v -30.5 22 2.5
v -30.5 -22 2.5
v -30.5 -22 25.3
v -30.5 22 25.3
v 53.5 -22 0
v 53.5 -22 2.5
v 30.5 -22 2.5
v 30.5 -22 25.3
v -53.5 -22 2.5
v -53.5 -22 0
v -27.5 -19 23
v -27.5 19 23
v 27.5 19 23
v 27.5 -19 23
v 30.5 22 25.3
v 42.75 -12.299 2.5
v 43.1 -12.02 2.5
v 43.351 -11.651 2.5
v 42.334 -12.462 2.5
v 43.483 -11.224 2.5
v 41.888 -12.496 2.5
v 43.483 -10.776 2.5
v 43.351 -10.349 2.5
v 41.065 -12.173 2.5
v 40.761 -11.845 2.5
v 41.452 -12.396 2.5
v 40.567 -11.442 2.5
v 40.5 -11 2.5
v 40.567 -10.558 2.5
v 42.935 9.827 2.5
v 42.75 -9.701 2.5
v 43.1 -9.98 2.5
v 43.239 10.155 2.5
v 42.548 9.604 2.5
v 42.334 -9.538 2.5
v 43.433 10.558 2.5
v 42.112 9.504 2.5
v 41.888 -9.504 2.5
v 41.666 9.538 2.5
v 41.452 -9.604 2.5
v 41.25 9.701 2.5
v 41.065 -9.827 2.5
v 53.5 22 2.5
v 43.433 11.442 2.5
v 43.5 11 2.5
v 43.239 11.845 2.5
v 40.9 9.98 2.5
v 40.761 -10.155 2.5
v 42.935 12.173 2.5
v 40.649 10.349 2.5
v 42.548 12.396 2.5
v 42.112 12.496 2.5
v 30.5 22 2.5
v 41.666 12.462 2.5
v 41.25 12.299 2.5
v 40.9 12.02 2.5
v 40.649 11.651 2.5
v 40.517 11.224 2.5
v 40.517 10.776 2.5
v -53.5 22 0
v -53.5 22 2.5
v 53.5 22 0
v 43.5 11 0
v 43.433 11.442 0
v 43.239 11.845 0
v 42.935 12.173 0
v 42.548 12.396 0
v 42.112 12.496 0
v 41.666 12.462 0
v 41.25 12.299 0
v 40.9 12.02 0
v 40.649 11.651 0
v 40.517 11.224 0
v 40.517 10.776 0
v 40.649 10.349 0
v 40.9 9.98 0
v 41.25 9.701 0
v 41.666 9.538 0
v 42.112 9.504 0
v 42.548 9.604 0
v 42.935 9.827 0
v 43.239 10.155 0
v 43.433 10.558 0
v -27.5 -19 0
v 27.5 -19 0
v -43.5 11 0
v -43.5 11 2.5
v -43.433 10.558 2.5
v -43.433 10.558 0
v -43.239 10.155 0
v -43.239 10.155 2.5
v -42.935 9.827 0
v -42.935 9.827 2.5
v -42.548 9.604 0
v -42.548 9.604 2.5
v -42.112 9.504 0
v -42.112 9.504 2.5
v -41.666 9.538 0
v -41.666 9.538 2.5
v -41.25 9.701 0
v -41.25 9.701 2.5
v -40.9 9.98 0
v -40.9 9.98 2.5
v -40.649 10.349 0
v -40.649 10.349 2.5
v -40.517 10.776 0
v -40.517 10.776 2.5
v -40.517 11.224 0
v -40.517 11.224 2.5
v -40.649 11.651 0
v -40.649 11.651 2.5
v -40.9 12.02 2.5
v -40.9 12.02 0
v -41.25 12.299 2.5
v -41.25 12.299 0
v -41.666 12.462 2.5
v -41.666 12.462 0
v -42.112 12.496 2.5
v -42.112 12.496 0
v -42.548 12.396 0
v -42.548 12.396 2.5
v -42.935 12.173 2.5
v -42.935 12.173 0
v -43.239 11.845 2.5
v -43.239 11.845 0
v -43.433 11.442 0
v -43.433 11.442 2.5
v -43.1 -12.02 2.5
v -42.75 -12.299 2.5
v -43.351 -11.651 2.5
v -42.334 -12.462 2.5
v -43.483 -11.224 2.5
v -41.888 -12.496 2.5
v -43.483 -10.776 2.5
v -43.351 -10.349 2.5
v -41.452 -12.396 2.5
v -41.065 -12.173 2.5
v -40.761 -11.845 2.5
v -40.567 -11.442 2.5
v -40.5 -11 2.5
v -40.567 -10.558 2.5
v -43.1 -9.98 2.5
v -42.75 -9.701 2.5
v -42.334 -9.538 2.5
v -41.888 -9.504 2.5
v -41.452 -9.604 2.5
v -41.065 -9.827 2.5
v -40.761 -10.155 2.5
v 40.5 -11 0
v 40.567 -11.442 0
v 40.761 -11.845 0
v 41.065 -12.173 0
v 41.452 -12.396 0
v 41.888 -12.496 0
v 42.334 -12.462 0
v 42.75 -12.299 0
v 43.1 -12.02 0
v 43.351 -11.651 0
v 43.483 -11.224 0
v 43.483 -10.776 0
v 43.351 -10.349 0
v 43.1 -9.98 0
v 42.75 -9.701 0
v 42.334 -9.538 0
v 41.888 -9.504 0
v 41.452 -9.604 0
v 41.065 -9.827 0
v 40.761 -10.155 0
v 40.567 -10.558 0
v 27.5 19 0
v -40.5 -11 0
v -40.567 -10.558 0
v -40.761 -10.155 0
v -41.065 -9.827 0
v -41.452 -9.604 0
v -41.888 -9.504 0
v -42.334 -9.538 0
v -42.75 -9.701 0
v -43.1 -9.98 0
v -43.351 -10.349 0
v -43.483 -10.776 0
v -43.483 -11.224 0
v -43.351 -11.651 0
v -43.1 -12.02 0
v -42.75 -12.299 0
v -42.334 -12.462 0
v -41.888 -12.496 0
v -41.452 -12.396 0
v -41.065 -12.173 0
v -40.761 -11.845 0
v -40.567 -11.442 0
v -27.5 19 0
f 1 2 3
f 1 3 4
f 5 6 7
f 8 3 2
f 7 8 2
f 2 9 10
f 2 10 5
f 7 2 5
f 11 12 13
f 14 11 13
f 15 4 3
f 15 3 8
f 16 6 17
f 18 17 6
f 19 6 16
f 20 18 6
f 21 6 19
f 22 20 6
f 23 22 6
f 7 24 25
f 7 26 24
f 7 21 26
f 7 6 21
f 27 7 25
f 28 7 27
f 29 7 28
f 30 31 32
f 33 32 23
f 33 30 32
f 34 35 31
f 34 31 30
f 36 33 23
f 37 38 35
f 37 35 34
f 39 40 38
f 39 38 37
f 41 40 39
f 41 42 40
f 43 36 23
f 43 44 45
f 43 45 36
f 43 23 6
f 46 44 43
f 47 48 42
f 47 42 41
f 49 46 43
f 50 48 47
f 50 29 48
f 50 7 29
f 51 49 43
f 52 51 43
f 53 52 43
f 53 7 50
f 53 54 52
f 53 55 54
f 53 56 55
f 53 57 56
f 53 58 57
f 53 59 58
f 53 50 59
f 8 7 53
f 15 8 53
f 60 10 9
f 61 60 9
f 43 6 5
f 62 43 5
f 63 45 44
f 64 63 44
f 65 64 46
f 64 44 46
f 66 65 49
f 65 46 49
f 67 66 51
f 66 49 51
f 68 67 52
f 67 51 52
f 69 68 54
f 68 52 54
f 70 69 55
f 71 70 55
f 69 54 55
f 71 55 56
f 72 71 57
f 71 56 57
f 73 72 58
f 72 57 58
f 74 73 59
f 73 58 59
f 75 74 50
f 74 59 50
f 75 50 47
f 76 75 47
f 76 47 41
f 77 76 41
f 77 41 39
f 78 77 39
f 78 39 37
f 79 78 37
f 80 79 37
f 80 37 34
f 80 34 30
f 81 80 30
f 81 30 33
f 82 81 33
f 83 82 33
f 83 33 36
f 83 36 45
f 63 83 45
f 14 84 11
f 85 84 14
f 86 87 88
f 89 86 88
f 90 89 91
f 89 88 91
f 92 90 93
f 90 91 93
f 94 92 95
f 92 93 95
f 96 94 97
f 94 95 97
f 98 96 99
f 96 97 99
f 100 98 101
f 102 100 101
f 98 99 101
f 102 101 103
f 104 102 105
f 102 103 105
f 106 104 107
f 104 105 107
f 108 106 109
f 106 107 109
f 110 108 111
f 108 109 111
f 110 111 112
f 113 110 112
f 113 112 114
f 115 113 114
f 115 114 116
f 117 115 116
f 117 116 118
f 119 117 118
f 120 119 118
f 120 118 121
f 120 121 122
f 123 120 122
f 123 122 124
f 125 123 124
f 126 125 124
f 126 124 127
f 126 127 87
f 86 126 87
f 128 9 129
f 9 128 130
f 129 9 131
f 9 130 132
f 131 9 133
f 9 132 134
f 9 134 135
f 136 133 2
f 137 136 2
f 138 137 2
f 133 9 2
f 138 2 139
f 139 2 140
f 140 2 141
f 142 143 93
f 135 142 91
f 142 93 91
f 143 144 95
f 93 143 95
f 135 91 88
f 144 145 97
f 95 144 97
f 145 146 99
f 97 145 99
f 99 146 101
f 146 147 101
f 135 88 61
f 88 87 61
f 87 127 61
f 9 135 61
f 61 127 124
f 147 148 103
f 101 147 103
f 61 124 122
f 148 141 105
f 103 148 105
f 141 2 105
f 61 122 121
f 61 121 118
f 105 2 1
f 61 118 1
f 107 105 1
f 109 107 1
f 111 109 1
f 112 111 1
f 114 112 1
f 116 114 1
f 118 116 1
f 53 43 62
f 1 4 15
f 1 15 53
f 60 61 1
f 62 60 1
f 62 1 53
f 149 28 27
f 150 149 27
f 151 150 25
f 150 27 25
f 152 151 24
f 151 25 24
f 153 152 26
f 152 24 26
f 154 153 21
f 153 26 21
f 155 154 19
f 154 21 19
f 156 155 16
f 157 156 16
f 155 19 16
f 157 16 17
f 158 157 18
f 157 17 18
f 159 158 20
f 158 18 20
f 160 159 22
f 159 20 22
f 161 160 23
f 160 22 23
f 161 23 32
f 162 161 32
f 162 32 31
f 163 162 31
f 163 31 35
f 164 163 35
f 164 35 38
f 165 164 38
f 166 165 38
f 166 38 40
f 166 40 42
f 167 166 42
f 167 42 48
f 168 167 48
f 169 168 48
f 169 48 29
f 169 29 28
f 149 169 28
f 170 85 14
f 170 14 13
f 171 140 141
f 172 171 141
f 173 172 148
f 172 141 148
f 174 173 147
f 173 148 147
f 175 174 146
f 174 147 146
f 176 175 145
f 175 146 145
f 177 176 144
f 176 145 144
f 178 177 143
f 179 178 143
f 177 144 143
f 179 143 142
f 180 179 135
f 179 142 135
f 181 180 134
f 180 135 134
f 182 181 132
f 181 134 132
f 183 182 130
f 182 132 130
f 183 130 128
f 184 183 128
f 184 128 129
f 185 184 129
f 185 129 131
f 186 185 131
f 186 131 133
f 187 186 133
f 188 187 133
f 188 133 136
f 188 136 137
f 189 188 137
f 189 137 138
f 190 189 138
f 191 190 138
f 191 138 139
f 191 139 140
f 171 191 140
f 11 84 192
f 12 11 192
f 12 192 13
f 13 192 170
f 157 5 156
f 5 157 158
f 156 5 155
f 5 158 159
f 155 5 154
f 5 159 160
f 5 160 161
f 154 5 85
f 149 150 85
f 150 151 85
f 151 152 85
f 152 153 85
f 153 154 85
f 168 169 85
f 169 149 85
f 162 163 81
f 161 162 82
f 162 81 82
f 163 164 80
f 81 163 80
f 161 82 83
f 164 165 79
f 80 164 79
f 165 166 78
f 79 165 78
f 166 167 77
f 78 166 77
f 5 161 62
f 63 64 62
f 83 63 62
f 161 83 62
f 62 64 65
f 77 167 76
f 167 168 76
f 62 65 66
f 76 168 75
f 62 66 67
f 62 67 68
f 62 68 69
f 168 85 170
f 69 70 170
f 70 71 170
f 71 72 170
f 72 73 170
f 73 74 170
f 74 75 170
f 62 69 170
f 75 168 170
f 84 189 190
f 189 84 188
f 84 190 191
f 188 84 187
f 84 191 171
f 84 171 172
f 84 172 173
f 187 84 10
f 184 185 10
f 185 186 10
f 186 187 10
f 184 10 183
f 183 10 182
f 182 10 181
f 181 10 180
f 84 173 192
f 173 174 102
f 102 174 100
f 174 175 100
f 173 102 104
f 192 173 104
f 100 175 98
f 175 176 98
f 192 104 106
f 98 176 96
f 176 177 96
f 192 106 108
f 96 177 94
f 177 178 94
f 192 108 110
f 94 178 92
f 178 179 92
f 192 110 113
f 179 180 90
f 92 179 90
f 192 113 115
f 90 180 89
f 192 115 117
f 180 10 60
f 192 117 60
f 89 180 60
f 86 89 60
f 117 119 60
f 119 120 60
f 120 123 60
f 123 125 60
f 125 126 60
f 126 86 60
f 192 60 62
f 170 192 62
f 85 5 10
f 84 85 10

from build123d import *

# Parameters (mm, degrees)
SKETCH1_W           = 61
SKETCH1_H           = 44
SKETCH1_W_2         = 55
SKETCH1_H_2         = 38
BOSS_EXTRUDE1_DEPTH = 23
SKETCH2_W           = 61
SKETCH2_H           = 44
BOSS_EXTRUDE2_DEPTH = 2.3
SKETCH3_W           = 2.5
SKETCH3_H           = 44
BOSS_EXTRUDE3_DEPTH = 23
SKETCH5_W           = 2.5
SKETCH5_H           = 44
BOSS_EXTRUDE4_DEPTH = 23
SKETCH6_R           = 1.5
CUT_EXTRUDE1_DEPTH  = 23


with BuildPart() as part:
    # Sketch1 → Boss-Extrude1 (new body)
    with BuildSketch(Plane.XY):
        Rectangle(SKETCH1_W, SKETCH1_H)
        Rectangle(SKETCH1_W_2, SKETCH1_H_2, mode=Mode.SUBTRACT)
    extrude(amount=BOSS_EXTRUDE1_DEPTH)

    # Sketch2 → Boss-Extrude2 (add)
    with BuildSketch(Plane.XY.offset(23)):
        Rectangle(SKETCH2_W, SKETCH2_H)
    extrude(amount=BOSS_EXTRUDE2_DEPTH)

    # Sketch3 → Boss-Extrude3 (add)
    with BuildSketch(Plane.ZY.offset(30.5)):
        with Locations((1.25, 0)):
            Rectangle(SKETCH3_W, SKETCH3_H)
    extrude(amount=BOSS_EXTRUDE3_DEPTH)

    # Sketch5 → Boss-Extrude4 (add)
    with BuildSketch(Plane(origin=(30.5, 0, 0), x_dir=(0, 0, -1), z_dir=(1, 0, 0))):
        with Locations((-1.25, 0)):
            Rectangle(SKETCH5_W, SKETCH5_H)
    extrude(amount=BOSS_EXTRUDE4_DEPTH)

    # Sketch6 → Cut-Extrude1 (cut)
    with BuildSketch(Plane.XY.offset(2.5)):
        with Locations((42, 11)):
            Circle(SKETCH6_R)
        with Locations(Location((42, -11, 0), (0, 0, 180))):
            Circle(SKETCH6_R)
        with Locations((-42, -11)):
            Circle(SKETCH6_R)
        with Locations(Location((-42, 11, 0), (0, 0, 180))):
            Circle(SKETCH6_R)
    extrude(amount=-CUT_EXTRUDE1_DEPTH, mode=Mode.SUBTRACT)


solid = part.part
